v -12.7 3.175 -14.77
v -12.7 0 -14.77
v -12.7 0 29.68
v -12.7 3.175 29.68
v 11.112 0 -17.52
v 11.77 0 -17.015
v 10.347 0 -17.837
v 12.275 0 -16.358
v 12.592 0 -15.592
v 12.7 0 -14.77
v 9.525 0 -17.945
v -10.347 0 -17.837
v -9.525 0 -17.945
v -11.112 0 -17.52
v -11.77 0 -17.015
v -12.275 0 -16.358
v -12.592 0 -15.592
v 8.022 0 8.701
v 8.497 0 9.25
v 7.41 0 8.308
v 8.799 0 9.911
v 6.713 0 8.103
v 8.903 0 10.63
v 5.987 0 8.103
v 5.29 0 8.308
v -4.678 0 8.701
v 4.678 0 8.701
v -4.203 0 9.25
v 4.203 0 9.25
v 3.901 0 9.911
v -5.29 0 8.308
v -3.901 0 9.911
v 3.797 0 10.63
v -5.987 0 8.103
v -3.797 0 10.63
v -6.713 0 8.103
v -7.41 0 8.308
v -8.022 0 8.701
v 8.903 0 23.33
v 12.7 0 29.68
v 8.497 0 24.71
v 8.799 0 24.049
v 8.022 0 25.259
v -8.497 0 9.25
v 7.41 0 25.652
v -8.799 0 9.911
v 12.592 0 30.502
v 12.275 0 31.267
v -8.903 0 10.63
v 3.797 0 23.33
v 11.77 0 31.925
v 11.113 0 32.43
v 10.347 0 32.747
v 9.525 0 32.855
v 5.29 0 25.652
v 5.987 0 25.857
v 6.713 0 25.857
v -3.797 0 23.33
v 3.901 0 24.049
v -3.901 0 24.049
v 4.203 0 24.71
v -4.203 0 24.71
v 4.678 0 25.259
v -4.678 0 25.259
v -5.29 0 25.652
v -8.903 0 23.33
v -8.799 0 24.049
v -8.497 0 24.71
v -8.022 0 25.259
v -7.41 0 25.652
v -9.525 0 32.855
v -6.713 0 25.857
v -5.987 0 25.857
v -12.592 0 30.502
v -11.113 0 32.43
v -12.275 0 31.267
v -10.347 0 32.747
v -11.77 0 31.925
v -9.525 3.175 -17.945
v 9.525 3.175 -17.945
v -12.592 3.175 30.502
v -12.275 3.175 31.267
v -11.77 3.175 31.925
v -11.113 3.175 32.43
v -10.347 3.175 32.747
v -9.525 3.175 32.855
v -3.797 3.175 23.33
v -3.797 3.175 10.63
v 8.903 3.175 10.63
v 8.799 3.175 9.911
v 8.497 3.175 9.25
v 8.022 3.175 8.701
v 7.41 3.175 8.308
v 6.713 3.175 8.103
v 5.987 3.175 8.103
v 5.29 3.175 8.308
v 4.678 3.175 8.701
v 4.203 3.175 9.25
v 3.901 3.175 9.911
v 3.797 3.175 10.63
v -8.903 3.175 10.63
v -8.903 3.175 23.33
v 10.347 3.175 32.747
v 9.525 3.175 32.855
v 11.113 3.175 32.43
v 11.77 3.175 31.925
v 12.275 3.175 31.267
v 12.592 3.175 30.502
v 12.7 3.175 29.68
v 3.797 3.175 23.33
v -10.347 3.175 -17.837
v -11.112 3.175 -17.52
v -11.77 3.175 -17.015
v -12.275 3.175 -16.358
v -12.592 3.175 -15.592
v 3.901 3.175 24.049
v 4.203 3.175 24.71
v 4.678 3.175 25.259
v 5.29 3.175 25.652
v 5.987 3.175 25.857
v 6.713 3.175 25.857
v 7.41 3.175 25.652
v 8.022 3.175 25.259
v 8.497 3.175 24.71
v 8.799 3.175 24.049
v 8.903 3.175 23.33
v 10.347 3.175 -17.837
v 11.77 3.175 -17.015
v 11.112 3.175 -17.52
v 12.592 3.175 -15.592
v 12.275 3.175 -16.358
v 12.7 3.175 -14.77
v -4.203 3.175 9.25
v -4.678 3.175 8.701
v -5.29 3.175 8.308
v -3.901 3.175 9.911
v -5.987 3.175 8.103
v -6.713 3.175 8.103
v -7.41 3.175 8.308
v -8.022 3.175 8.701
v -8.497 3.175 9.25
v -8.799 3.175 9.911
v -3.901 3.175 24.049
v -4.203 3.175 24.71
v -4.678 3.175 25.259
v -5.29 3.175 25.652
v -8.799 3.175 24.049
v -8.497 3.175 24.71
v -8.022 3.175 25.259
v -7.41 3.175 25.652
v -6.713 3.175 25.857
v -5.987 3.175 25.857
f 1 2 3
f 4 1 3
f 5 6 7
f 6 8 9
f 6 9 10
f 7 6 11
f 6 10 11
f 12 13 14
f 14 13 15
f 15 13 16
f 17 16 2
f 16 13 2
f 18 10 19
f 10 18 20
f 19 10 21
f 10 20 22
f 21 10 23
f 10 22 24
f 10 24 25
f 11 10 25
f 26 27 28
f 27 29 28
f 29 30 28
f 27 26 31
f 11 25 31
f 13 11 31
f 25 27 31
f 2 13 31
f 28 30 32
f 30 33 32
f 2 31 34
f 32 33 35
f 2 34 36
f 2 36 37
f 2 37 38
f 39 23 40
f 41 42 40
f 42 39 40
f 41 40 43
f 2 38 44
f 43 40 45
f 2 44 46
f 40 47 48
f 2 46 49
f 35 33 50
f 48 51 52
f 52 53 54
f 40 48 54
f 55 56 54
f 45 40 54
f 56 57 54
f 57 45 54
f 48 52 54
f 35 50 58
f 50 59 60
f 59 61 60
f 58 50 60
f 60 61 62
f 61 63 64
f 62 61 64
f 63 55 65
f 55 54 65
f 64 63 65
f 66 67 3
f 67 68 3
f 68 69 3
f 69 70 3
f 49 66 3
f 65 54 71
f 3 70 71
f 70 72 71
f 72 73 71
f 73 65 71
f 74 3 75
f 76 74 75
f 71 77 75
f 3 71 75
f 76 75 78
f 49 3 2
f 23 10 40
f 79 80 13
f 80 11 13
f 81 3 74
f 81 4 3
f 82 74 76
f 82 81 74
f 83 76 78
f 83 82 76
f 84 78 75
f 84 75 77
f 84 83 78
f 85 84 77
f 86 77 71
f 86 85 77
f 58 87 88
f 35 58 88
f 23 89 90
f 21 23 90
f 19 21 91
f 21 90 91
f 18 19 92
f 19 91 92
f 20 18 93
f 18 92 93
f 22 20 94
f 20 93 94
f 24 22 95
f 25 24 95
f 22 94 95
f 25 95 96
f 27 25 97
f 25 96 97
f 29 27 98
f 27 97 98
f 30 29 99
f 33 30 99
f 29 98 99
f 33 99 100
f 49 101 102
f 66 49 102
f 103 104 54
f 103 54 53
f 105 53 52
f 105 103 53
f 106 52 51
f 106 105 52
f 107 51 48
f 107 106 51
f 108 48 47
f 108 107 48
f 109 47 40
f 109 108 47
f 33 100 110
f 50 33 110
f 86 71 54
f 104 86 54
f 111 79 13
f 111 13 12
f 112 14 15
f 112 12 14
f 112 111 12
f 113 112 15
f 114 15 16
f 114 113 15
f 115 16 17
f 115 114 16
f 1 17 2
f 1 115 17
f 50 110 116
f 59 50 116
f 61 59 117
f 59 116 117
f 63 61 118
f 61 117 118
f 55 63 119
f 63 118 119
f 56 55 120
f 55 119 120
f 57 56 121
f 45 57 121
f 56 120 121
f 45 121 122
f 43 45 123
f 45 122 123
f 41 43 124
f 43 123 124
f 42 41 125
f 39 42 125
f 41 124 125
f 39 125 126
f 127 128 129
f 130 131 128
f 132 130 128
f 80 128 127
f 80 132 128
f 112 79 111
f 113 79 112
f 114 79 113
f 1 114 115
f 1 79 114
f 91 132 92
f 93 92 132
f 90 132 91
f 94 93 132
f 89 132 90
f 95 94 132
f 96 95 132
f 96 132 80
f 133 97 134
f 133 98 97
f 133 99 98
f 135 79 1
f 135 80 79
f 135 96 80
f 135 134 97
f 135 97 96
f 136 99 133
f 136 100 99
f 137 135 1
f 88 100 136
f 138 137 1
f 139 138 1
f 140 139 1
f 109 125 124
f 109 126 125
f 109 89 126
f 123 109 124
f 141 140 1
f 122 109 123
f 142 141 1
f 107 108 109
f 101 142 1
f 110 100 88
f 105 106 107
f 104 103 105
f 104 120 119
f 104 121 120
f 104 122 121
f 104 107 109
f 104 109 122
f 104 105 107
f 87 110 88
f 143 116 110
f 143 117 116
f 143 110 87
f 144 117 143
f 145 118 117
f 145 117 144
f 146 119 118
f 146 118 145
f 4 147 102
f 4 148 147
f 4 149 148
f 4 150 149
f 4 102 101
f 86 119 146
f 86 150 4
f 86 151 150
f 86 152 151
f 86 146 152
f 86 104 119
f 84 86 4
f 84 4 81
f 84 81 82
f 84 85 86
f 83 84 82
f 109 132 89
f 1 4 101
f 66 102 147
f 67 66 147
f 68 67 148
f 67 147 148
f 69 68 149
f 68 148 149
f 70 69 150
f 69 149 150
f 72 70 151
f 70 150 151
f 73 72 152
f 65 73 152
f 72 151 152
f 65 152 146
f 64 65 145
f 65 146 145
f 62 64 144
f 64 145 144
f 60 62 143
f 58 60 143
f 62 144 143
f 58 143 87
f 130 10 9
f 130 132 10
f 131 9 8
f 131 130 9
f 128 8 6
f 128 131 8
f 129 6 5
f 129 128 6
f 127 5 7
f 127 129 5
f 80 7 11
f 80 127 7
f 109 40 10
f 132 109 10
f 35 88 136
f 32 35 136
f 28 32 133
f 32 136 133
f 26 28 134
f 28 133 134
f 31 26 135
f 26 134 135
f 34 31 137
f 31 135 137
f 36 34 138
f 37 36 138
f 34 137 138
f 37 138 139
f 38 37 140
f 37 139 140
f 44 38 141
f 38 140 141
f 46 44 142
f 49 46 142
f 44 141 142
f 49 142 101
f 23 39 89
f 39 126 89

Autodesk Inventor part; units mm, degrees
ref_plane "YZ Plane" through (0, 0, 0) normal (1, 0, 0) x (0, 1, 0)
ref_plane "XZ Plane" through (0, 0, 0) normal (0, 1, 0) x (-1, 0, 0)
ref_plane "XY Plane" through (0, 0, 0) normal (0, 0, 1) x (1, 0, 0)
sketch "Sketch1" plane through (0, 0, 0) normal (0, 1, 0) x (-1, 0, 0)
  line L0 (8.89, 0) -> (-8.89, 0) construction
  line L1 (8.89, 1.5875) -> (-8.89, 1.5875)
  line L2 (-8.89, -1.5875) -> (8.89, -1.5875)
  arc A0 (8.89, -1.5875) -> (8.89, 1.5875) centre (8.89, 0) ccw
  arc A1 (-8.89, 1.5875) -> (-8.89, -1.5875) centre (-8.89, 0) ccw
  line L3 (8.89, -5.0038) -> (-8.89, -5.0038) construction
  line L4 (8.89, -3.4163) -> (-8.89, -3.4163)
  line L5 (-8.89, -6.5913) -> (8.89, -6.5913)
  arc A2 (8.89, -6.5913) -> (8.89, -3.4163) centre (8.89, -5.0038) ccw
  arc A3 (-8.89, -3.4163) -> (-8.89, -6.5913) centre (-8.89, -5.0038) ccw
  line L6 (8.89, -10.0076) -> (-8.89, -10.0076) construction
  line L7 (8.89, -8.4201) -> (-8.89, -8.4201)
  line L8 (-8.89, -11.5951) -> (8.89, -11.5951)
  arc A4 (8.89, -11.5951) -> (8.89, -8.4201) centre (8.89, -10.0076) ccw
  arc A5 (-8.89, -8.4201) -> (-8.89, -11.5951) centre (-8.89, -10.0076) ccw
  line L9 (12.7, 32.8549) -> (-12.7, 32.8549)
  line L10 (-12.7, 32.8549) -> (-12.7, -17.9451)
  line L11 (-12.7, -17.9451) -> (12.7, -17.9451)
  line L12 (12.7, -17.9451) -> (12.7, 32.8549)
  line L13 (6.35, 26.5049) -> (-6.35, 26.5049) construction
  arc A6 (8.89, -16.5989) -> (8.89, -13.4239) centre (8.89, -15.0114) ccw
  line L14 (-8.89, -16.5989) -> (8.89, -16.5989)
  arc A7 (-8.89, -13.4239) -> (-8.89, -16.5989) centre (-8.89, -15.0114) ccw
  line L15 (8.89, -13.4239) -> (-8.89, -13.4239)
  point P0 (0, 0)
  point P1 (0, -5.0038)
  point P2 (0, -10.0076)
  point P3 (10.4775, -5.0038)
  point P4 (10.4775, 0)
  point P5 (10.4775, -10.0076)
  point P6 (0, -17.9451)
  point P7 (0, -11.5951)
  point P8 (0, 26.5049)
  point P9 (0, 32.8549)
  point P10 (10.4775, -15.0114)
  point P11 (0, -16.5989)
  dimension "d1" = 17.78
  dimension "d3" = 3.175
  dimension "d4" = 5.0038
  dimension "d5" = 5.0038
  dimension "d8" = 25.4
  dimension "d9" = 50.8
  dimension "d10" = 6.35
  dimension "d11" = 12.7
  dimension "d12" = 6.35
  dimension "d43" = 5.0038
extrude "Extrusion1" add sketch "Sketch1" along normal blind 3.175 contours A0 L2 A1 L1 | A2 L5 A3 L4 | A4 L8 A5 L7 | L12 L11 L10 L9 | L14 A7 L15 A6
fillet "Fillet1" radius 3.175 4 edges at (-12.7, 1.5875, -17.9451) (12.7, 1.5875, -17.9451) (12.7, 1.5875, 32.8549) (-12.7, 1.5875, 32.8549)
sketch "Sketch2" plane through (0, 3.175, 0) normal (0, 1, 0) x (1, 0, 0)
  line L0 (-6.35, -10.6299) -> (-6.35, -23.3299) construction
  line L1 (-8.9027, -10.6299) -> (-8.9027, -23.3299)
  line L2 (-3.7973, -23.3299) -> (-3.7973, -10.6299)
  arc A0 (-3.7973, -10.6299) -> (-8.9027, -10.6299) centre (-6.35, -10.6299) ccw
  arc A1 (-8.9027, -23.3299) -> (-3.7973, -23.3299) centre (-6.35, -23.3299) ccw
  line L3 (6.35, -10.6299) -> (6.35, -23.3299) construction
  line L4 (3.7973, -10.6299) -> (3.7973, -23.3299)
  line L5 (8.9027, -23.3299) -> (8.9027, -10.6299)
  arc A2 (8.9027, -10.6299) -> (3.7973, -10.6299) centre (6.35, -10.6299) ccw
  arc A3 (3.7973, -23.3299) -> (8.9027, -23.3299) centre (6.35, -23.3299) ccw
  line L6 (-9.525, -32.8549) -> (9.525, -32.8549) projected
  line L7 (9.525, 17.9451) -> (-9.525, 17.9451) projected
  line L8 (-6.35, -16.9799) -> (6.35, -16.9799) construction
  point P0 (0, 0)
  point P1 (0, -16.9799)
  point P2 (0, 17.9451)
  dimension "d23" = 5.1054
  dimension "d24" = 12.7
  dimension "d26" = 34.925
  dimension "d27" = 12.7
extrude "Extrusion2" cut sketch "Sketch2" against normal blind 25.4
sketch "Sketch3" plane through (0, 3.175, 0) normal (0, 1, 0) x (1, 0, 0)
  circle A0 centre (0, -45.5549) radius 16.002
  line L0 (-9.525, -32.8549) -> (9.525, -32.8549) projected
  circle A1 centre (0, -45.5549) radius 19.177
  line L1 (3.7973, -10.6299) -> (3.7973, -23.3299) projected
  arc A2 (3.7973, -23.3299) -> (8.9027, -23.3299) centre (6.35, -23.3299) ccw projected
  line L2 (8.9027, -23.3299) -> (8.9027, -10.6299) projected
  arc A3 (8.9027, -10.6299) -> (3.7973, -10.6299) centre (6.35, -10.6299) ccw projected
  line L3 (-8.9027, -10.6299) -> (-8.9027, -23.3299) projected
  arc A4 (-8.9027, -23.3299) -> (-3.7973, -23.3299) centre (-6.35, -23.3299) ccw projected
  line L4 (-3.7973, -23.3299) -> (-3.7973, -10.6299) projected
  arc A5 (-3.7973, -10.6299) -> (-8.9027, -10.6299) centre (-6.35, -10.6299) ccw projected
  arc A6 (-12.7, -29.6799) -> (-9.525, -32.8549) centre (-9.525, -29.6799) ccw projected
  line L5 (-12.7, -29.6799) -> (-12.7, 14.7701) projected
  arc A7 (-9.525, 17.9451) -> (-12.7, 14.7701) centre (-9.525, 14.7701) ccw projected
  line L6 (-9.525, 17.9451) -> (9.525, 17.9451) projected
  arc A8 (12.7, 14.7701) -> (9.525, 17.9451) centre (9.525, 14.7701) ccw projected
  line L7 (12.7, 14.7701) -> (12.7, -29.6799) projected
  arc A9 (9.525, -32.8549) -> (12.7, -29.6799) centre (9.525, -29.6799) ccw projected
  line L8 (9.525, -32.8549) -> (-9.525, -32.8549) projected
  line L9 (3.7973, -10.6299) -> (3.7973, -23.3299) projected
  arc A10 (3.7973, -23.3299) -> (8.9027, -23.3299) centre (6.35, -23.3299) ccw projected
  line L10 (8.9027, -23.3299) -> (8.9027, -10.6299) projected
  arc A11 (8.9027, -10.6299) -> (3.7973, -10.6299) centre (6.35, -10.6299) ccw projected
  line L11 (-8.9027, -10.6299) -> (-8.9027, -23.3299) projected
  arc A12 (-8.9027, -23.3299) -> (-3.7973, -23.3299) centre (-6.35, -23.3299) ccw projected
  line L12 (-3.7973, -23.3299) -> (-3.7973, -10.6299) projected
  arc A13 (-3.7973, -10.6299) -> (-8.9027, -10.6299) centre (-6.35, -10.6299) ccw projected
  arc A14 (-12.7, -29.6799) -> (-9.525, -32.8549) centre (-9.525, -29.6799) ccw projected
  line L13 (-12.7, -29.6799) -> (-12.7, 14.7701) projected
  arc A15 (-9.525, 17.9451) -> (-12.7, 14.7701) centre (-9.525, 14.7701) ccw projected
  line L14 (-9.525, 17.9451) -> (9.525, 17.9451) projected
  arc A16 (12.7, 14.7701) -> (9.525, 17.9451) centre (9.525, 14.7701) ccw projected
  line L15 (12.7, 14.7701) -> (12.7, -29.6799) projected
  arc A17 (9.525, -32.8549) -> (12.7, -29.6799) centre (9.525, -29.6799) ccw projected
  line L16 (9.525, -32.8549) -> (-9.525, -32.8549) projected
  point P0 (0, 0)
  point P1 (0, -32.8549)
  point P2 (12.433, -30.9543)
  point P3 (9.7268, -32.8485)
  point P4 (-9.7268, -32.8485)
  point P5 (-12.433, -30.9543)
  dimension "d30" = 32.004
  dimension "d31" = 12.7
  dimension "d32" = 3.175
sketch "Sketch4" plane through (0, 3.175, 0) normal (0, 1, 0) x (1, 0, 0)
  circle A0 centre (0, -60.4901) radius 1.1811
  arc A1 (-8.5911, -32.8549) -> (-10.7176, -33.6722) centre (-8.5911, -36.0299) ccw projected
  arc A2 (-10.7176, -33.6722) -> (10.7176, -33.6722) centre (0, -45.5549) ccw projected
  arc A3 (10.7176, -33.6722) -> (8.5911, -32.8549) centre (8.5911, -36.0299) ccw projected
  line L0 (8.5911, -32.8549) -> (-8.5911, -32.8549) projected
  arc A4 (12.6992, -29.749) -> (13.6187, -32.0535) centre (15.8735, -29.8182) ccw projected
  arc A5 (-13.6187, -32.0535) -> (13.6187, -32.0535) centre (0, -45.5549) ccw projected
  arc A6 (-13.6187, -32.0535) -> (-12.6992, -29.749) centre (-15.8735, -29.8182) ccw projected
  arc A7 (-12.7, -29.6799) -> (-12.6992, -29.749) centre (-9.525, -29.6799) ccw projected
  line L1 (-12.7, -29.6799) -> (-12.7, 14.7701) projected
  arc A8 (-9.525, 17.9451) -> (-12.7, 14.7701) centre (-9.525, 14.7701) ccw projected
  line L2 (-9.525, 17.9451) -> (9.525, 17.9451) projected
  arc A9 (12.7, 14.7701) -> (9.525, 17.9451) centre (9.525, 14.7701) ccw projected
  line L3 (12.7, 14.7701) -> (12.7, -29.6799) projected
  arc A10 (12.6992, -29.749) -> (12.7, -29.6799) centre (9.525, -29.6799) ccw projected
  line L4 (3.7973, -10.6299) -> (3.7973, -23.3299) projected
  arc A11 (3.7973, -23.3299) -> (8.9027, -23.3299) centre (6.35, -23.3299) ccw projected
  line L5 (8.9027, -23.3299) -> (8.9027, -10.6299) projected
  arc A12 (8.9027, -10.6299) -> (3.7973, -10.6299) centre (6.35, -10.6299) ccw projected
  line L6 (-8.9027, -10.6299) -> (-8.9027, -23.3299) projected
  arc A13 (-8.9027, -23.3299) -> (-3.7973, -23.3299) centre (-6.35, -23.3299) ccw projected
  line L7 (-3.7973, -23.3299) -> (-3.7973, -10.6299) projected
  arc A14 (-3.7973, -10.6299) -> (-8.9027, -10.6299) centre (-6.35, -10.6299) ccw projected
  point P0 (0, 0)
  point P1 (0, -61.5569)
  point P2 (-0.5246, -61.5483)
  point P3 (0.5246, -61.5483)
  dimension "d36" = 2.3622
  dimension "d37" = 1.0668
sketch "Sketch5" plane through (0, 3.175, 0) normal (0, 1, 0) x (1, 0, 0)
  arc A0 (-8.5911, -32.8549) -> (-10.7176, -33.6722) centre (-8.5911, -36.0299) ccw construction
  arc A1 (-10.7176, -33.6722) -> (-4.3651, -60.95) centre (0, -45.5549) ccw construction
  arc A2 (-4.3651, -60.95) -> (-0.9487, -59.7866) centre (-3.499, -57.8954) ccw construction
  arc A3 (0.9487, -59.7866) -> (-0.9487, -59.7866) centre (0, -60.4901) ccw construction
  arc A4 (0.9487, -59.7866) -> (4.3651, -60.95) centre (3.499, -57.8954) ccw construction
  arc A5 (4.3651, -60.95) -> (10.7176, -33.6722) centre (0, -45.5549) ccw construction
  arc A6 (10.7176, -33.6722) -> (8.5911, -32.8549) centre (8.5911, -36.0299) ccw construction
  line L0 (8.5911, -32.8549) -> (-8.5911, -32.8549) construction
  arc A7 (12.6992, -29.749) -> (13.6187, -32.0535) centre (15.8735, -29.8182) ccw construction
  arc A8 (-13.6187, -32.0535) -> (13.6187, -32.0535) centre (0, -45.5549) ccw construction
  arc A9 (-13.6187, -32.0535) -> (-12.6992, -29.749) centre (-15.8735, -29.8182) ccw construction
  arc A10 (-12.7, -29.6799) -> (-12.6992, -29.749) centre (-9.525, -29.6799) ccw construction
  line L1 (-12.7, -29.6799) -> (-12.7, 14.7701) construction
  arc A11 (-9.525, 17.9451) -> (-12.7, 14.7701) centre (-9.525, 14.7701) ccw construction
  line L2 (-9.525, 17.9451) -> (9.525, 17.9451) construction
  arc A12 (12.7, 14.7701) -> (9.525, 17.9451) centre (9.525, 14.7701) ccw construction
  line L3 (12.7, 14.7701) -> (12.7, -29.6799) construction
  arc A13 (12.6992, -29.749) -> (12.7, -29.6799) centre (9.525, -29.6799) ccw construction
  line L4 (3.7973, -10.6299) -> (3.7973, -23.3299) construction
  arc A14 (3.7973, -23.3299) -> (8.9027, -23.3299) centre (6.35, -23.3299) ccw construction
  line L5 (8.9027, -23.3299) -> (8.9027, -10.6299) construction
  arc A15 (8.9027, -10.6299) -> (3.7973, -10.6299) centre (6.35, -10.6299) ccw construction
  line L6 (-8.9027, -10.6299) -> (-8.9027, -23.3299) construction
  arc A16 (-8.9027, -23.3299) -> (-3.7973, -23.3299) centre (-6.35, -23.3299) ccw construction
  line L7 (-3.7973, -23.3299) -> (-3.7973, -10.6299) construction
  arc A17 (-3.7973, -10.6299) -> (-8.9027, -10.6299) centre (-6.35, -10.6299) ccw construction
  line L8 (-22.86, -21.4249) -> (22.86, -21.4249)
  line L9 (22.86, -21.4249) -> (22.86, -69.6849)
  line L10 (22.86, -69.6849) -> (-22.86, -69.6849)
  line L11 (-22.86, -69.6849) -> (-22.86, -21.4249)
  line L12 (-22.86, -21.4249) -> (22.86, -69.6849) construction
  line L13 (22.86, -21.4249) -> (-22.86, -69.6849) construction
  line L14 (-22.86, -41.1099) -> (-12.7, -23.3299)
  line L15 (-12.7, 14.7701) -> (-12.7, -29.6799) construction
  line L16 (12.7, -29.6799) -> (12.7, 14.7701) construction
  line L17 (12.7, -23.3299) -> (22.86, -41.1099)
  arc A18 (-13.6187, -32.0535) -> (-12.6992, -29.749) centre (-15.8735, -29.8182) ccw construction
  arc A19 (-13.6187, -32.0535) -> (13.6187, -32.0535) centre (0, -45.5549) ccw construction
  arc A20 (-13.6187, -32.0535) -> (13.6187, -32.0535) centre (0, -45.5549) ccw
  arc A21 (12.6992, -29.749) -> (13.6187, -32.0535) centre (15.8735, -29.8182) ccw
  arc A22 (-13.5868, -32.0214) -> (-12.6998, -29.7145) centre (-15.8735, -29.8182) ccw
  arc A23 (-12.7, -29.6799) -> (-12.6992, -29.749) centre (-9.525, -29.6799) ccw construction
  line L18 (-13.5868, -32.0214) -> (-13.6187, -32.0535)
  line L19 (-12.7, -23.3299) -> (-12.6998, -29.7145)
  line L20 (12.7, -23.3299) -> (12.7, -29.6799)
  arc A24 (12.6992, -29.749) -> (12.7, -29.6799) centre (9.525, -29.6799) ccw construction
  line L21 (12.7, -29.916) -> (12.7, -29.6799)
  point P0 (0, 0)
  dimension "d48" = 45.72
  dimension "d49" = 87.63
  dimension "d50" = 28.575
equation "\"d5\" = d4"
equation "\"d43\" = d5"
properties part number "EL2-034" material "Aluminum 6061"
